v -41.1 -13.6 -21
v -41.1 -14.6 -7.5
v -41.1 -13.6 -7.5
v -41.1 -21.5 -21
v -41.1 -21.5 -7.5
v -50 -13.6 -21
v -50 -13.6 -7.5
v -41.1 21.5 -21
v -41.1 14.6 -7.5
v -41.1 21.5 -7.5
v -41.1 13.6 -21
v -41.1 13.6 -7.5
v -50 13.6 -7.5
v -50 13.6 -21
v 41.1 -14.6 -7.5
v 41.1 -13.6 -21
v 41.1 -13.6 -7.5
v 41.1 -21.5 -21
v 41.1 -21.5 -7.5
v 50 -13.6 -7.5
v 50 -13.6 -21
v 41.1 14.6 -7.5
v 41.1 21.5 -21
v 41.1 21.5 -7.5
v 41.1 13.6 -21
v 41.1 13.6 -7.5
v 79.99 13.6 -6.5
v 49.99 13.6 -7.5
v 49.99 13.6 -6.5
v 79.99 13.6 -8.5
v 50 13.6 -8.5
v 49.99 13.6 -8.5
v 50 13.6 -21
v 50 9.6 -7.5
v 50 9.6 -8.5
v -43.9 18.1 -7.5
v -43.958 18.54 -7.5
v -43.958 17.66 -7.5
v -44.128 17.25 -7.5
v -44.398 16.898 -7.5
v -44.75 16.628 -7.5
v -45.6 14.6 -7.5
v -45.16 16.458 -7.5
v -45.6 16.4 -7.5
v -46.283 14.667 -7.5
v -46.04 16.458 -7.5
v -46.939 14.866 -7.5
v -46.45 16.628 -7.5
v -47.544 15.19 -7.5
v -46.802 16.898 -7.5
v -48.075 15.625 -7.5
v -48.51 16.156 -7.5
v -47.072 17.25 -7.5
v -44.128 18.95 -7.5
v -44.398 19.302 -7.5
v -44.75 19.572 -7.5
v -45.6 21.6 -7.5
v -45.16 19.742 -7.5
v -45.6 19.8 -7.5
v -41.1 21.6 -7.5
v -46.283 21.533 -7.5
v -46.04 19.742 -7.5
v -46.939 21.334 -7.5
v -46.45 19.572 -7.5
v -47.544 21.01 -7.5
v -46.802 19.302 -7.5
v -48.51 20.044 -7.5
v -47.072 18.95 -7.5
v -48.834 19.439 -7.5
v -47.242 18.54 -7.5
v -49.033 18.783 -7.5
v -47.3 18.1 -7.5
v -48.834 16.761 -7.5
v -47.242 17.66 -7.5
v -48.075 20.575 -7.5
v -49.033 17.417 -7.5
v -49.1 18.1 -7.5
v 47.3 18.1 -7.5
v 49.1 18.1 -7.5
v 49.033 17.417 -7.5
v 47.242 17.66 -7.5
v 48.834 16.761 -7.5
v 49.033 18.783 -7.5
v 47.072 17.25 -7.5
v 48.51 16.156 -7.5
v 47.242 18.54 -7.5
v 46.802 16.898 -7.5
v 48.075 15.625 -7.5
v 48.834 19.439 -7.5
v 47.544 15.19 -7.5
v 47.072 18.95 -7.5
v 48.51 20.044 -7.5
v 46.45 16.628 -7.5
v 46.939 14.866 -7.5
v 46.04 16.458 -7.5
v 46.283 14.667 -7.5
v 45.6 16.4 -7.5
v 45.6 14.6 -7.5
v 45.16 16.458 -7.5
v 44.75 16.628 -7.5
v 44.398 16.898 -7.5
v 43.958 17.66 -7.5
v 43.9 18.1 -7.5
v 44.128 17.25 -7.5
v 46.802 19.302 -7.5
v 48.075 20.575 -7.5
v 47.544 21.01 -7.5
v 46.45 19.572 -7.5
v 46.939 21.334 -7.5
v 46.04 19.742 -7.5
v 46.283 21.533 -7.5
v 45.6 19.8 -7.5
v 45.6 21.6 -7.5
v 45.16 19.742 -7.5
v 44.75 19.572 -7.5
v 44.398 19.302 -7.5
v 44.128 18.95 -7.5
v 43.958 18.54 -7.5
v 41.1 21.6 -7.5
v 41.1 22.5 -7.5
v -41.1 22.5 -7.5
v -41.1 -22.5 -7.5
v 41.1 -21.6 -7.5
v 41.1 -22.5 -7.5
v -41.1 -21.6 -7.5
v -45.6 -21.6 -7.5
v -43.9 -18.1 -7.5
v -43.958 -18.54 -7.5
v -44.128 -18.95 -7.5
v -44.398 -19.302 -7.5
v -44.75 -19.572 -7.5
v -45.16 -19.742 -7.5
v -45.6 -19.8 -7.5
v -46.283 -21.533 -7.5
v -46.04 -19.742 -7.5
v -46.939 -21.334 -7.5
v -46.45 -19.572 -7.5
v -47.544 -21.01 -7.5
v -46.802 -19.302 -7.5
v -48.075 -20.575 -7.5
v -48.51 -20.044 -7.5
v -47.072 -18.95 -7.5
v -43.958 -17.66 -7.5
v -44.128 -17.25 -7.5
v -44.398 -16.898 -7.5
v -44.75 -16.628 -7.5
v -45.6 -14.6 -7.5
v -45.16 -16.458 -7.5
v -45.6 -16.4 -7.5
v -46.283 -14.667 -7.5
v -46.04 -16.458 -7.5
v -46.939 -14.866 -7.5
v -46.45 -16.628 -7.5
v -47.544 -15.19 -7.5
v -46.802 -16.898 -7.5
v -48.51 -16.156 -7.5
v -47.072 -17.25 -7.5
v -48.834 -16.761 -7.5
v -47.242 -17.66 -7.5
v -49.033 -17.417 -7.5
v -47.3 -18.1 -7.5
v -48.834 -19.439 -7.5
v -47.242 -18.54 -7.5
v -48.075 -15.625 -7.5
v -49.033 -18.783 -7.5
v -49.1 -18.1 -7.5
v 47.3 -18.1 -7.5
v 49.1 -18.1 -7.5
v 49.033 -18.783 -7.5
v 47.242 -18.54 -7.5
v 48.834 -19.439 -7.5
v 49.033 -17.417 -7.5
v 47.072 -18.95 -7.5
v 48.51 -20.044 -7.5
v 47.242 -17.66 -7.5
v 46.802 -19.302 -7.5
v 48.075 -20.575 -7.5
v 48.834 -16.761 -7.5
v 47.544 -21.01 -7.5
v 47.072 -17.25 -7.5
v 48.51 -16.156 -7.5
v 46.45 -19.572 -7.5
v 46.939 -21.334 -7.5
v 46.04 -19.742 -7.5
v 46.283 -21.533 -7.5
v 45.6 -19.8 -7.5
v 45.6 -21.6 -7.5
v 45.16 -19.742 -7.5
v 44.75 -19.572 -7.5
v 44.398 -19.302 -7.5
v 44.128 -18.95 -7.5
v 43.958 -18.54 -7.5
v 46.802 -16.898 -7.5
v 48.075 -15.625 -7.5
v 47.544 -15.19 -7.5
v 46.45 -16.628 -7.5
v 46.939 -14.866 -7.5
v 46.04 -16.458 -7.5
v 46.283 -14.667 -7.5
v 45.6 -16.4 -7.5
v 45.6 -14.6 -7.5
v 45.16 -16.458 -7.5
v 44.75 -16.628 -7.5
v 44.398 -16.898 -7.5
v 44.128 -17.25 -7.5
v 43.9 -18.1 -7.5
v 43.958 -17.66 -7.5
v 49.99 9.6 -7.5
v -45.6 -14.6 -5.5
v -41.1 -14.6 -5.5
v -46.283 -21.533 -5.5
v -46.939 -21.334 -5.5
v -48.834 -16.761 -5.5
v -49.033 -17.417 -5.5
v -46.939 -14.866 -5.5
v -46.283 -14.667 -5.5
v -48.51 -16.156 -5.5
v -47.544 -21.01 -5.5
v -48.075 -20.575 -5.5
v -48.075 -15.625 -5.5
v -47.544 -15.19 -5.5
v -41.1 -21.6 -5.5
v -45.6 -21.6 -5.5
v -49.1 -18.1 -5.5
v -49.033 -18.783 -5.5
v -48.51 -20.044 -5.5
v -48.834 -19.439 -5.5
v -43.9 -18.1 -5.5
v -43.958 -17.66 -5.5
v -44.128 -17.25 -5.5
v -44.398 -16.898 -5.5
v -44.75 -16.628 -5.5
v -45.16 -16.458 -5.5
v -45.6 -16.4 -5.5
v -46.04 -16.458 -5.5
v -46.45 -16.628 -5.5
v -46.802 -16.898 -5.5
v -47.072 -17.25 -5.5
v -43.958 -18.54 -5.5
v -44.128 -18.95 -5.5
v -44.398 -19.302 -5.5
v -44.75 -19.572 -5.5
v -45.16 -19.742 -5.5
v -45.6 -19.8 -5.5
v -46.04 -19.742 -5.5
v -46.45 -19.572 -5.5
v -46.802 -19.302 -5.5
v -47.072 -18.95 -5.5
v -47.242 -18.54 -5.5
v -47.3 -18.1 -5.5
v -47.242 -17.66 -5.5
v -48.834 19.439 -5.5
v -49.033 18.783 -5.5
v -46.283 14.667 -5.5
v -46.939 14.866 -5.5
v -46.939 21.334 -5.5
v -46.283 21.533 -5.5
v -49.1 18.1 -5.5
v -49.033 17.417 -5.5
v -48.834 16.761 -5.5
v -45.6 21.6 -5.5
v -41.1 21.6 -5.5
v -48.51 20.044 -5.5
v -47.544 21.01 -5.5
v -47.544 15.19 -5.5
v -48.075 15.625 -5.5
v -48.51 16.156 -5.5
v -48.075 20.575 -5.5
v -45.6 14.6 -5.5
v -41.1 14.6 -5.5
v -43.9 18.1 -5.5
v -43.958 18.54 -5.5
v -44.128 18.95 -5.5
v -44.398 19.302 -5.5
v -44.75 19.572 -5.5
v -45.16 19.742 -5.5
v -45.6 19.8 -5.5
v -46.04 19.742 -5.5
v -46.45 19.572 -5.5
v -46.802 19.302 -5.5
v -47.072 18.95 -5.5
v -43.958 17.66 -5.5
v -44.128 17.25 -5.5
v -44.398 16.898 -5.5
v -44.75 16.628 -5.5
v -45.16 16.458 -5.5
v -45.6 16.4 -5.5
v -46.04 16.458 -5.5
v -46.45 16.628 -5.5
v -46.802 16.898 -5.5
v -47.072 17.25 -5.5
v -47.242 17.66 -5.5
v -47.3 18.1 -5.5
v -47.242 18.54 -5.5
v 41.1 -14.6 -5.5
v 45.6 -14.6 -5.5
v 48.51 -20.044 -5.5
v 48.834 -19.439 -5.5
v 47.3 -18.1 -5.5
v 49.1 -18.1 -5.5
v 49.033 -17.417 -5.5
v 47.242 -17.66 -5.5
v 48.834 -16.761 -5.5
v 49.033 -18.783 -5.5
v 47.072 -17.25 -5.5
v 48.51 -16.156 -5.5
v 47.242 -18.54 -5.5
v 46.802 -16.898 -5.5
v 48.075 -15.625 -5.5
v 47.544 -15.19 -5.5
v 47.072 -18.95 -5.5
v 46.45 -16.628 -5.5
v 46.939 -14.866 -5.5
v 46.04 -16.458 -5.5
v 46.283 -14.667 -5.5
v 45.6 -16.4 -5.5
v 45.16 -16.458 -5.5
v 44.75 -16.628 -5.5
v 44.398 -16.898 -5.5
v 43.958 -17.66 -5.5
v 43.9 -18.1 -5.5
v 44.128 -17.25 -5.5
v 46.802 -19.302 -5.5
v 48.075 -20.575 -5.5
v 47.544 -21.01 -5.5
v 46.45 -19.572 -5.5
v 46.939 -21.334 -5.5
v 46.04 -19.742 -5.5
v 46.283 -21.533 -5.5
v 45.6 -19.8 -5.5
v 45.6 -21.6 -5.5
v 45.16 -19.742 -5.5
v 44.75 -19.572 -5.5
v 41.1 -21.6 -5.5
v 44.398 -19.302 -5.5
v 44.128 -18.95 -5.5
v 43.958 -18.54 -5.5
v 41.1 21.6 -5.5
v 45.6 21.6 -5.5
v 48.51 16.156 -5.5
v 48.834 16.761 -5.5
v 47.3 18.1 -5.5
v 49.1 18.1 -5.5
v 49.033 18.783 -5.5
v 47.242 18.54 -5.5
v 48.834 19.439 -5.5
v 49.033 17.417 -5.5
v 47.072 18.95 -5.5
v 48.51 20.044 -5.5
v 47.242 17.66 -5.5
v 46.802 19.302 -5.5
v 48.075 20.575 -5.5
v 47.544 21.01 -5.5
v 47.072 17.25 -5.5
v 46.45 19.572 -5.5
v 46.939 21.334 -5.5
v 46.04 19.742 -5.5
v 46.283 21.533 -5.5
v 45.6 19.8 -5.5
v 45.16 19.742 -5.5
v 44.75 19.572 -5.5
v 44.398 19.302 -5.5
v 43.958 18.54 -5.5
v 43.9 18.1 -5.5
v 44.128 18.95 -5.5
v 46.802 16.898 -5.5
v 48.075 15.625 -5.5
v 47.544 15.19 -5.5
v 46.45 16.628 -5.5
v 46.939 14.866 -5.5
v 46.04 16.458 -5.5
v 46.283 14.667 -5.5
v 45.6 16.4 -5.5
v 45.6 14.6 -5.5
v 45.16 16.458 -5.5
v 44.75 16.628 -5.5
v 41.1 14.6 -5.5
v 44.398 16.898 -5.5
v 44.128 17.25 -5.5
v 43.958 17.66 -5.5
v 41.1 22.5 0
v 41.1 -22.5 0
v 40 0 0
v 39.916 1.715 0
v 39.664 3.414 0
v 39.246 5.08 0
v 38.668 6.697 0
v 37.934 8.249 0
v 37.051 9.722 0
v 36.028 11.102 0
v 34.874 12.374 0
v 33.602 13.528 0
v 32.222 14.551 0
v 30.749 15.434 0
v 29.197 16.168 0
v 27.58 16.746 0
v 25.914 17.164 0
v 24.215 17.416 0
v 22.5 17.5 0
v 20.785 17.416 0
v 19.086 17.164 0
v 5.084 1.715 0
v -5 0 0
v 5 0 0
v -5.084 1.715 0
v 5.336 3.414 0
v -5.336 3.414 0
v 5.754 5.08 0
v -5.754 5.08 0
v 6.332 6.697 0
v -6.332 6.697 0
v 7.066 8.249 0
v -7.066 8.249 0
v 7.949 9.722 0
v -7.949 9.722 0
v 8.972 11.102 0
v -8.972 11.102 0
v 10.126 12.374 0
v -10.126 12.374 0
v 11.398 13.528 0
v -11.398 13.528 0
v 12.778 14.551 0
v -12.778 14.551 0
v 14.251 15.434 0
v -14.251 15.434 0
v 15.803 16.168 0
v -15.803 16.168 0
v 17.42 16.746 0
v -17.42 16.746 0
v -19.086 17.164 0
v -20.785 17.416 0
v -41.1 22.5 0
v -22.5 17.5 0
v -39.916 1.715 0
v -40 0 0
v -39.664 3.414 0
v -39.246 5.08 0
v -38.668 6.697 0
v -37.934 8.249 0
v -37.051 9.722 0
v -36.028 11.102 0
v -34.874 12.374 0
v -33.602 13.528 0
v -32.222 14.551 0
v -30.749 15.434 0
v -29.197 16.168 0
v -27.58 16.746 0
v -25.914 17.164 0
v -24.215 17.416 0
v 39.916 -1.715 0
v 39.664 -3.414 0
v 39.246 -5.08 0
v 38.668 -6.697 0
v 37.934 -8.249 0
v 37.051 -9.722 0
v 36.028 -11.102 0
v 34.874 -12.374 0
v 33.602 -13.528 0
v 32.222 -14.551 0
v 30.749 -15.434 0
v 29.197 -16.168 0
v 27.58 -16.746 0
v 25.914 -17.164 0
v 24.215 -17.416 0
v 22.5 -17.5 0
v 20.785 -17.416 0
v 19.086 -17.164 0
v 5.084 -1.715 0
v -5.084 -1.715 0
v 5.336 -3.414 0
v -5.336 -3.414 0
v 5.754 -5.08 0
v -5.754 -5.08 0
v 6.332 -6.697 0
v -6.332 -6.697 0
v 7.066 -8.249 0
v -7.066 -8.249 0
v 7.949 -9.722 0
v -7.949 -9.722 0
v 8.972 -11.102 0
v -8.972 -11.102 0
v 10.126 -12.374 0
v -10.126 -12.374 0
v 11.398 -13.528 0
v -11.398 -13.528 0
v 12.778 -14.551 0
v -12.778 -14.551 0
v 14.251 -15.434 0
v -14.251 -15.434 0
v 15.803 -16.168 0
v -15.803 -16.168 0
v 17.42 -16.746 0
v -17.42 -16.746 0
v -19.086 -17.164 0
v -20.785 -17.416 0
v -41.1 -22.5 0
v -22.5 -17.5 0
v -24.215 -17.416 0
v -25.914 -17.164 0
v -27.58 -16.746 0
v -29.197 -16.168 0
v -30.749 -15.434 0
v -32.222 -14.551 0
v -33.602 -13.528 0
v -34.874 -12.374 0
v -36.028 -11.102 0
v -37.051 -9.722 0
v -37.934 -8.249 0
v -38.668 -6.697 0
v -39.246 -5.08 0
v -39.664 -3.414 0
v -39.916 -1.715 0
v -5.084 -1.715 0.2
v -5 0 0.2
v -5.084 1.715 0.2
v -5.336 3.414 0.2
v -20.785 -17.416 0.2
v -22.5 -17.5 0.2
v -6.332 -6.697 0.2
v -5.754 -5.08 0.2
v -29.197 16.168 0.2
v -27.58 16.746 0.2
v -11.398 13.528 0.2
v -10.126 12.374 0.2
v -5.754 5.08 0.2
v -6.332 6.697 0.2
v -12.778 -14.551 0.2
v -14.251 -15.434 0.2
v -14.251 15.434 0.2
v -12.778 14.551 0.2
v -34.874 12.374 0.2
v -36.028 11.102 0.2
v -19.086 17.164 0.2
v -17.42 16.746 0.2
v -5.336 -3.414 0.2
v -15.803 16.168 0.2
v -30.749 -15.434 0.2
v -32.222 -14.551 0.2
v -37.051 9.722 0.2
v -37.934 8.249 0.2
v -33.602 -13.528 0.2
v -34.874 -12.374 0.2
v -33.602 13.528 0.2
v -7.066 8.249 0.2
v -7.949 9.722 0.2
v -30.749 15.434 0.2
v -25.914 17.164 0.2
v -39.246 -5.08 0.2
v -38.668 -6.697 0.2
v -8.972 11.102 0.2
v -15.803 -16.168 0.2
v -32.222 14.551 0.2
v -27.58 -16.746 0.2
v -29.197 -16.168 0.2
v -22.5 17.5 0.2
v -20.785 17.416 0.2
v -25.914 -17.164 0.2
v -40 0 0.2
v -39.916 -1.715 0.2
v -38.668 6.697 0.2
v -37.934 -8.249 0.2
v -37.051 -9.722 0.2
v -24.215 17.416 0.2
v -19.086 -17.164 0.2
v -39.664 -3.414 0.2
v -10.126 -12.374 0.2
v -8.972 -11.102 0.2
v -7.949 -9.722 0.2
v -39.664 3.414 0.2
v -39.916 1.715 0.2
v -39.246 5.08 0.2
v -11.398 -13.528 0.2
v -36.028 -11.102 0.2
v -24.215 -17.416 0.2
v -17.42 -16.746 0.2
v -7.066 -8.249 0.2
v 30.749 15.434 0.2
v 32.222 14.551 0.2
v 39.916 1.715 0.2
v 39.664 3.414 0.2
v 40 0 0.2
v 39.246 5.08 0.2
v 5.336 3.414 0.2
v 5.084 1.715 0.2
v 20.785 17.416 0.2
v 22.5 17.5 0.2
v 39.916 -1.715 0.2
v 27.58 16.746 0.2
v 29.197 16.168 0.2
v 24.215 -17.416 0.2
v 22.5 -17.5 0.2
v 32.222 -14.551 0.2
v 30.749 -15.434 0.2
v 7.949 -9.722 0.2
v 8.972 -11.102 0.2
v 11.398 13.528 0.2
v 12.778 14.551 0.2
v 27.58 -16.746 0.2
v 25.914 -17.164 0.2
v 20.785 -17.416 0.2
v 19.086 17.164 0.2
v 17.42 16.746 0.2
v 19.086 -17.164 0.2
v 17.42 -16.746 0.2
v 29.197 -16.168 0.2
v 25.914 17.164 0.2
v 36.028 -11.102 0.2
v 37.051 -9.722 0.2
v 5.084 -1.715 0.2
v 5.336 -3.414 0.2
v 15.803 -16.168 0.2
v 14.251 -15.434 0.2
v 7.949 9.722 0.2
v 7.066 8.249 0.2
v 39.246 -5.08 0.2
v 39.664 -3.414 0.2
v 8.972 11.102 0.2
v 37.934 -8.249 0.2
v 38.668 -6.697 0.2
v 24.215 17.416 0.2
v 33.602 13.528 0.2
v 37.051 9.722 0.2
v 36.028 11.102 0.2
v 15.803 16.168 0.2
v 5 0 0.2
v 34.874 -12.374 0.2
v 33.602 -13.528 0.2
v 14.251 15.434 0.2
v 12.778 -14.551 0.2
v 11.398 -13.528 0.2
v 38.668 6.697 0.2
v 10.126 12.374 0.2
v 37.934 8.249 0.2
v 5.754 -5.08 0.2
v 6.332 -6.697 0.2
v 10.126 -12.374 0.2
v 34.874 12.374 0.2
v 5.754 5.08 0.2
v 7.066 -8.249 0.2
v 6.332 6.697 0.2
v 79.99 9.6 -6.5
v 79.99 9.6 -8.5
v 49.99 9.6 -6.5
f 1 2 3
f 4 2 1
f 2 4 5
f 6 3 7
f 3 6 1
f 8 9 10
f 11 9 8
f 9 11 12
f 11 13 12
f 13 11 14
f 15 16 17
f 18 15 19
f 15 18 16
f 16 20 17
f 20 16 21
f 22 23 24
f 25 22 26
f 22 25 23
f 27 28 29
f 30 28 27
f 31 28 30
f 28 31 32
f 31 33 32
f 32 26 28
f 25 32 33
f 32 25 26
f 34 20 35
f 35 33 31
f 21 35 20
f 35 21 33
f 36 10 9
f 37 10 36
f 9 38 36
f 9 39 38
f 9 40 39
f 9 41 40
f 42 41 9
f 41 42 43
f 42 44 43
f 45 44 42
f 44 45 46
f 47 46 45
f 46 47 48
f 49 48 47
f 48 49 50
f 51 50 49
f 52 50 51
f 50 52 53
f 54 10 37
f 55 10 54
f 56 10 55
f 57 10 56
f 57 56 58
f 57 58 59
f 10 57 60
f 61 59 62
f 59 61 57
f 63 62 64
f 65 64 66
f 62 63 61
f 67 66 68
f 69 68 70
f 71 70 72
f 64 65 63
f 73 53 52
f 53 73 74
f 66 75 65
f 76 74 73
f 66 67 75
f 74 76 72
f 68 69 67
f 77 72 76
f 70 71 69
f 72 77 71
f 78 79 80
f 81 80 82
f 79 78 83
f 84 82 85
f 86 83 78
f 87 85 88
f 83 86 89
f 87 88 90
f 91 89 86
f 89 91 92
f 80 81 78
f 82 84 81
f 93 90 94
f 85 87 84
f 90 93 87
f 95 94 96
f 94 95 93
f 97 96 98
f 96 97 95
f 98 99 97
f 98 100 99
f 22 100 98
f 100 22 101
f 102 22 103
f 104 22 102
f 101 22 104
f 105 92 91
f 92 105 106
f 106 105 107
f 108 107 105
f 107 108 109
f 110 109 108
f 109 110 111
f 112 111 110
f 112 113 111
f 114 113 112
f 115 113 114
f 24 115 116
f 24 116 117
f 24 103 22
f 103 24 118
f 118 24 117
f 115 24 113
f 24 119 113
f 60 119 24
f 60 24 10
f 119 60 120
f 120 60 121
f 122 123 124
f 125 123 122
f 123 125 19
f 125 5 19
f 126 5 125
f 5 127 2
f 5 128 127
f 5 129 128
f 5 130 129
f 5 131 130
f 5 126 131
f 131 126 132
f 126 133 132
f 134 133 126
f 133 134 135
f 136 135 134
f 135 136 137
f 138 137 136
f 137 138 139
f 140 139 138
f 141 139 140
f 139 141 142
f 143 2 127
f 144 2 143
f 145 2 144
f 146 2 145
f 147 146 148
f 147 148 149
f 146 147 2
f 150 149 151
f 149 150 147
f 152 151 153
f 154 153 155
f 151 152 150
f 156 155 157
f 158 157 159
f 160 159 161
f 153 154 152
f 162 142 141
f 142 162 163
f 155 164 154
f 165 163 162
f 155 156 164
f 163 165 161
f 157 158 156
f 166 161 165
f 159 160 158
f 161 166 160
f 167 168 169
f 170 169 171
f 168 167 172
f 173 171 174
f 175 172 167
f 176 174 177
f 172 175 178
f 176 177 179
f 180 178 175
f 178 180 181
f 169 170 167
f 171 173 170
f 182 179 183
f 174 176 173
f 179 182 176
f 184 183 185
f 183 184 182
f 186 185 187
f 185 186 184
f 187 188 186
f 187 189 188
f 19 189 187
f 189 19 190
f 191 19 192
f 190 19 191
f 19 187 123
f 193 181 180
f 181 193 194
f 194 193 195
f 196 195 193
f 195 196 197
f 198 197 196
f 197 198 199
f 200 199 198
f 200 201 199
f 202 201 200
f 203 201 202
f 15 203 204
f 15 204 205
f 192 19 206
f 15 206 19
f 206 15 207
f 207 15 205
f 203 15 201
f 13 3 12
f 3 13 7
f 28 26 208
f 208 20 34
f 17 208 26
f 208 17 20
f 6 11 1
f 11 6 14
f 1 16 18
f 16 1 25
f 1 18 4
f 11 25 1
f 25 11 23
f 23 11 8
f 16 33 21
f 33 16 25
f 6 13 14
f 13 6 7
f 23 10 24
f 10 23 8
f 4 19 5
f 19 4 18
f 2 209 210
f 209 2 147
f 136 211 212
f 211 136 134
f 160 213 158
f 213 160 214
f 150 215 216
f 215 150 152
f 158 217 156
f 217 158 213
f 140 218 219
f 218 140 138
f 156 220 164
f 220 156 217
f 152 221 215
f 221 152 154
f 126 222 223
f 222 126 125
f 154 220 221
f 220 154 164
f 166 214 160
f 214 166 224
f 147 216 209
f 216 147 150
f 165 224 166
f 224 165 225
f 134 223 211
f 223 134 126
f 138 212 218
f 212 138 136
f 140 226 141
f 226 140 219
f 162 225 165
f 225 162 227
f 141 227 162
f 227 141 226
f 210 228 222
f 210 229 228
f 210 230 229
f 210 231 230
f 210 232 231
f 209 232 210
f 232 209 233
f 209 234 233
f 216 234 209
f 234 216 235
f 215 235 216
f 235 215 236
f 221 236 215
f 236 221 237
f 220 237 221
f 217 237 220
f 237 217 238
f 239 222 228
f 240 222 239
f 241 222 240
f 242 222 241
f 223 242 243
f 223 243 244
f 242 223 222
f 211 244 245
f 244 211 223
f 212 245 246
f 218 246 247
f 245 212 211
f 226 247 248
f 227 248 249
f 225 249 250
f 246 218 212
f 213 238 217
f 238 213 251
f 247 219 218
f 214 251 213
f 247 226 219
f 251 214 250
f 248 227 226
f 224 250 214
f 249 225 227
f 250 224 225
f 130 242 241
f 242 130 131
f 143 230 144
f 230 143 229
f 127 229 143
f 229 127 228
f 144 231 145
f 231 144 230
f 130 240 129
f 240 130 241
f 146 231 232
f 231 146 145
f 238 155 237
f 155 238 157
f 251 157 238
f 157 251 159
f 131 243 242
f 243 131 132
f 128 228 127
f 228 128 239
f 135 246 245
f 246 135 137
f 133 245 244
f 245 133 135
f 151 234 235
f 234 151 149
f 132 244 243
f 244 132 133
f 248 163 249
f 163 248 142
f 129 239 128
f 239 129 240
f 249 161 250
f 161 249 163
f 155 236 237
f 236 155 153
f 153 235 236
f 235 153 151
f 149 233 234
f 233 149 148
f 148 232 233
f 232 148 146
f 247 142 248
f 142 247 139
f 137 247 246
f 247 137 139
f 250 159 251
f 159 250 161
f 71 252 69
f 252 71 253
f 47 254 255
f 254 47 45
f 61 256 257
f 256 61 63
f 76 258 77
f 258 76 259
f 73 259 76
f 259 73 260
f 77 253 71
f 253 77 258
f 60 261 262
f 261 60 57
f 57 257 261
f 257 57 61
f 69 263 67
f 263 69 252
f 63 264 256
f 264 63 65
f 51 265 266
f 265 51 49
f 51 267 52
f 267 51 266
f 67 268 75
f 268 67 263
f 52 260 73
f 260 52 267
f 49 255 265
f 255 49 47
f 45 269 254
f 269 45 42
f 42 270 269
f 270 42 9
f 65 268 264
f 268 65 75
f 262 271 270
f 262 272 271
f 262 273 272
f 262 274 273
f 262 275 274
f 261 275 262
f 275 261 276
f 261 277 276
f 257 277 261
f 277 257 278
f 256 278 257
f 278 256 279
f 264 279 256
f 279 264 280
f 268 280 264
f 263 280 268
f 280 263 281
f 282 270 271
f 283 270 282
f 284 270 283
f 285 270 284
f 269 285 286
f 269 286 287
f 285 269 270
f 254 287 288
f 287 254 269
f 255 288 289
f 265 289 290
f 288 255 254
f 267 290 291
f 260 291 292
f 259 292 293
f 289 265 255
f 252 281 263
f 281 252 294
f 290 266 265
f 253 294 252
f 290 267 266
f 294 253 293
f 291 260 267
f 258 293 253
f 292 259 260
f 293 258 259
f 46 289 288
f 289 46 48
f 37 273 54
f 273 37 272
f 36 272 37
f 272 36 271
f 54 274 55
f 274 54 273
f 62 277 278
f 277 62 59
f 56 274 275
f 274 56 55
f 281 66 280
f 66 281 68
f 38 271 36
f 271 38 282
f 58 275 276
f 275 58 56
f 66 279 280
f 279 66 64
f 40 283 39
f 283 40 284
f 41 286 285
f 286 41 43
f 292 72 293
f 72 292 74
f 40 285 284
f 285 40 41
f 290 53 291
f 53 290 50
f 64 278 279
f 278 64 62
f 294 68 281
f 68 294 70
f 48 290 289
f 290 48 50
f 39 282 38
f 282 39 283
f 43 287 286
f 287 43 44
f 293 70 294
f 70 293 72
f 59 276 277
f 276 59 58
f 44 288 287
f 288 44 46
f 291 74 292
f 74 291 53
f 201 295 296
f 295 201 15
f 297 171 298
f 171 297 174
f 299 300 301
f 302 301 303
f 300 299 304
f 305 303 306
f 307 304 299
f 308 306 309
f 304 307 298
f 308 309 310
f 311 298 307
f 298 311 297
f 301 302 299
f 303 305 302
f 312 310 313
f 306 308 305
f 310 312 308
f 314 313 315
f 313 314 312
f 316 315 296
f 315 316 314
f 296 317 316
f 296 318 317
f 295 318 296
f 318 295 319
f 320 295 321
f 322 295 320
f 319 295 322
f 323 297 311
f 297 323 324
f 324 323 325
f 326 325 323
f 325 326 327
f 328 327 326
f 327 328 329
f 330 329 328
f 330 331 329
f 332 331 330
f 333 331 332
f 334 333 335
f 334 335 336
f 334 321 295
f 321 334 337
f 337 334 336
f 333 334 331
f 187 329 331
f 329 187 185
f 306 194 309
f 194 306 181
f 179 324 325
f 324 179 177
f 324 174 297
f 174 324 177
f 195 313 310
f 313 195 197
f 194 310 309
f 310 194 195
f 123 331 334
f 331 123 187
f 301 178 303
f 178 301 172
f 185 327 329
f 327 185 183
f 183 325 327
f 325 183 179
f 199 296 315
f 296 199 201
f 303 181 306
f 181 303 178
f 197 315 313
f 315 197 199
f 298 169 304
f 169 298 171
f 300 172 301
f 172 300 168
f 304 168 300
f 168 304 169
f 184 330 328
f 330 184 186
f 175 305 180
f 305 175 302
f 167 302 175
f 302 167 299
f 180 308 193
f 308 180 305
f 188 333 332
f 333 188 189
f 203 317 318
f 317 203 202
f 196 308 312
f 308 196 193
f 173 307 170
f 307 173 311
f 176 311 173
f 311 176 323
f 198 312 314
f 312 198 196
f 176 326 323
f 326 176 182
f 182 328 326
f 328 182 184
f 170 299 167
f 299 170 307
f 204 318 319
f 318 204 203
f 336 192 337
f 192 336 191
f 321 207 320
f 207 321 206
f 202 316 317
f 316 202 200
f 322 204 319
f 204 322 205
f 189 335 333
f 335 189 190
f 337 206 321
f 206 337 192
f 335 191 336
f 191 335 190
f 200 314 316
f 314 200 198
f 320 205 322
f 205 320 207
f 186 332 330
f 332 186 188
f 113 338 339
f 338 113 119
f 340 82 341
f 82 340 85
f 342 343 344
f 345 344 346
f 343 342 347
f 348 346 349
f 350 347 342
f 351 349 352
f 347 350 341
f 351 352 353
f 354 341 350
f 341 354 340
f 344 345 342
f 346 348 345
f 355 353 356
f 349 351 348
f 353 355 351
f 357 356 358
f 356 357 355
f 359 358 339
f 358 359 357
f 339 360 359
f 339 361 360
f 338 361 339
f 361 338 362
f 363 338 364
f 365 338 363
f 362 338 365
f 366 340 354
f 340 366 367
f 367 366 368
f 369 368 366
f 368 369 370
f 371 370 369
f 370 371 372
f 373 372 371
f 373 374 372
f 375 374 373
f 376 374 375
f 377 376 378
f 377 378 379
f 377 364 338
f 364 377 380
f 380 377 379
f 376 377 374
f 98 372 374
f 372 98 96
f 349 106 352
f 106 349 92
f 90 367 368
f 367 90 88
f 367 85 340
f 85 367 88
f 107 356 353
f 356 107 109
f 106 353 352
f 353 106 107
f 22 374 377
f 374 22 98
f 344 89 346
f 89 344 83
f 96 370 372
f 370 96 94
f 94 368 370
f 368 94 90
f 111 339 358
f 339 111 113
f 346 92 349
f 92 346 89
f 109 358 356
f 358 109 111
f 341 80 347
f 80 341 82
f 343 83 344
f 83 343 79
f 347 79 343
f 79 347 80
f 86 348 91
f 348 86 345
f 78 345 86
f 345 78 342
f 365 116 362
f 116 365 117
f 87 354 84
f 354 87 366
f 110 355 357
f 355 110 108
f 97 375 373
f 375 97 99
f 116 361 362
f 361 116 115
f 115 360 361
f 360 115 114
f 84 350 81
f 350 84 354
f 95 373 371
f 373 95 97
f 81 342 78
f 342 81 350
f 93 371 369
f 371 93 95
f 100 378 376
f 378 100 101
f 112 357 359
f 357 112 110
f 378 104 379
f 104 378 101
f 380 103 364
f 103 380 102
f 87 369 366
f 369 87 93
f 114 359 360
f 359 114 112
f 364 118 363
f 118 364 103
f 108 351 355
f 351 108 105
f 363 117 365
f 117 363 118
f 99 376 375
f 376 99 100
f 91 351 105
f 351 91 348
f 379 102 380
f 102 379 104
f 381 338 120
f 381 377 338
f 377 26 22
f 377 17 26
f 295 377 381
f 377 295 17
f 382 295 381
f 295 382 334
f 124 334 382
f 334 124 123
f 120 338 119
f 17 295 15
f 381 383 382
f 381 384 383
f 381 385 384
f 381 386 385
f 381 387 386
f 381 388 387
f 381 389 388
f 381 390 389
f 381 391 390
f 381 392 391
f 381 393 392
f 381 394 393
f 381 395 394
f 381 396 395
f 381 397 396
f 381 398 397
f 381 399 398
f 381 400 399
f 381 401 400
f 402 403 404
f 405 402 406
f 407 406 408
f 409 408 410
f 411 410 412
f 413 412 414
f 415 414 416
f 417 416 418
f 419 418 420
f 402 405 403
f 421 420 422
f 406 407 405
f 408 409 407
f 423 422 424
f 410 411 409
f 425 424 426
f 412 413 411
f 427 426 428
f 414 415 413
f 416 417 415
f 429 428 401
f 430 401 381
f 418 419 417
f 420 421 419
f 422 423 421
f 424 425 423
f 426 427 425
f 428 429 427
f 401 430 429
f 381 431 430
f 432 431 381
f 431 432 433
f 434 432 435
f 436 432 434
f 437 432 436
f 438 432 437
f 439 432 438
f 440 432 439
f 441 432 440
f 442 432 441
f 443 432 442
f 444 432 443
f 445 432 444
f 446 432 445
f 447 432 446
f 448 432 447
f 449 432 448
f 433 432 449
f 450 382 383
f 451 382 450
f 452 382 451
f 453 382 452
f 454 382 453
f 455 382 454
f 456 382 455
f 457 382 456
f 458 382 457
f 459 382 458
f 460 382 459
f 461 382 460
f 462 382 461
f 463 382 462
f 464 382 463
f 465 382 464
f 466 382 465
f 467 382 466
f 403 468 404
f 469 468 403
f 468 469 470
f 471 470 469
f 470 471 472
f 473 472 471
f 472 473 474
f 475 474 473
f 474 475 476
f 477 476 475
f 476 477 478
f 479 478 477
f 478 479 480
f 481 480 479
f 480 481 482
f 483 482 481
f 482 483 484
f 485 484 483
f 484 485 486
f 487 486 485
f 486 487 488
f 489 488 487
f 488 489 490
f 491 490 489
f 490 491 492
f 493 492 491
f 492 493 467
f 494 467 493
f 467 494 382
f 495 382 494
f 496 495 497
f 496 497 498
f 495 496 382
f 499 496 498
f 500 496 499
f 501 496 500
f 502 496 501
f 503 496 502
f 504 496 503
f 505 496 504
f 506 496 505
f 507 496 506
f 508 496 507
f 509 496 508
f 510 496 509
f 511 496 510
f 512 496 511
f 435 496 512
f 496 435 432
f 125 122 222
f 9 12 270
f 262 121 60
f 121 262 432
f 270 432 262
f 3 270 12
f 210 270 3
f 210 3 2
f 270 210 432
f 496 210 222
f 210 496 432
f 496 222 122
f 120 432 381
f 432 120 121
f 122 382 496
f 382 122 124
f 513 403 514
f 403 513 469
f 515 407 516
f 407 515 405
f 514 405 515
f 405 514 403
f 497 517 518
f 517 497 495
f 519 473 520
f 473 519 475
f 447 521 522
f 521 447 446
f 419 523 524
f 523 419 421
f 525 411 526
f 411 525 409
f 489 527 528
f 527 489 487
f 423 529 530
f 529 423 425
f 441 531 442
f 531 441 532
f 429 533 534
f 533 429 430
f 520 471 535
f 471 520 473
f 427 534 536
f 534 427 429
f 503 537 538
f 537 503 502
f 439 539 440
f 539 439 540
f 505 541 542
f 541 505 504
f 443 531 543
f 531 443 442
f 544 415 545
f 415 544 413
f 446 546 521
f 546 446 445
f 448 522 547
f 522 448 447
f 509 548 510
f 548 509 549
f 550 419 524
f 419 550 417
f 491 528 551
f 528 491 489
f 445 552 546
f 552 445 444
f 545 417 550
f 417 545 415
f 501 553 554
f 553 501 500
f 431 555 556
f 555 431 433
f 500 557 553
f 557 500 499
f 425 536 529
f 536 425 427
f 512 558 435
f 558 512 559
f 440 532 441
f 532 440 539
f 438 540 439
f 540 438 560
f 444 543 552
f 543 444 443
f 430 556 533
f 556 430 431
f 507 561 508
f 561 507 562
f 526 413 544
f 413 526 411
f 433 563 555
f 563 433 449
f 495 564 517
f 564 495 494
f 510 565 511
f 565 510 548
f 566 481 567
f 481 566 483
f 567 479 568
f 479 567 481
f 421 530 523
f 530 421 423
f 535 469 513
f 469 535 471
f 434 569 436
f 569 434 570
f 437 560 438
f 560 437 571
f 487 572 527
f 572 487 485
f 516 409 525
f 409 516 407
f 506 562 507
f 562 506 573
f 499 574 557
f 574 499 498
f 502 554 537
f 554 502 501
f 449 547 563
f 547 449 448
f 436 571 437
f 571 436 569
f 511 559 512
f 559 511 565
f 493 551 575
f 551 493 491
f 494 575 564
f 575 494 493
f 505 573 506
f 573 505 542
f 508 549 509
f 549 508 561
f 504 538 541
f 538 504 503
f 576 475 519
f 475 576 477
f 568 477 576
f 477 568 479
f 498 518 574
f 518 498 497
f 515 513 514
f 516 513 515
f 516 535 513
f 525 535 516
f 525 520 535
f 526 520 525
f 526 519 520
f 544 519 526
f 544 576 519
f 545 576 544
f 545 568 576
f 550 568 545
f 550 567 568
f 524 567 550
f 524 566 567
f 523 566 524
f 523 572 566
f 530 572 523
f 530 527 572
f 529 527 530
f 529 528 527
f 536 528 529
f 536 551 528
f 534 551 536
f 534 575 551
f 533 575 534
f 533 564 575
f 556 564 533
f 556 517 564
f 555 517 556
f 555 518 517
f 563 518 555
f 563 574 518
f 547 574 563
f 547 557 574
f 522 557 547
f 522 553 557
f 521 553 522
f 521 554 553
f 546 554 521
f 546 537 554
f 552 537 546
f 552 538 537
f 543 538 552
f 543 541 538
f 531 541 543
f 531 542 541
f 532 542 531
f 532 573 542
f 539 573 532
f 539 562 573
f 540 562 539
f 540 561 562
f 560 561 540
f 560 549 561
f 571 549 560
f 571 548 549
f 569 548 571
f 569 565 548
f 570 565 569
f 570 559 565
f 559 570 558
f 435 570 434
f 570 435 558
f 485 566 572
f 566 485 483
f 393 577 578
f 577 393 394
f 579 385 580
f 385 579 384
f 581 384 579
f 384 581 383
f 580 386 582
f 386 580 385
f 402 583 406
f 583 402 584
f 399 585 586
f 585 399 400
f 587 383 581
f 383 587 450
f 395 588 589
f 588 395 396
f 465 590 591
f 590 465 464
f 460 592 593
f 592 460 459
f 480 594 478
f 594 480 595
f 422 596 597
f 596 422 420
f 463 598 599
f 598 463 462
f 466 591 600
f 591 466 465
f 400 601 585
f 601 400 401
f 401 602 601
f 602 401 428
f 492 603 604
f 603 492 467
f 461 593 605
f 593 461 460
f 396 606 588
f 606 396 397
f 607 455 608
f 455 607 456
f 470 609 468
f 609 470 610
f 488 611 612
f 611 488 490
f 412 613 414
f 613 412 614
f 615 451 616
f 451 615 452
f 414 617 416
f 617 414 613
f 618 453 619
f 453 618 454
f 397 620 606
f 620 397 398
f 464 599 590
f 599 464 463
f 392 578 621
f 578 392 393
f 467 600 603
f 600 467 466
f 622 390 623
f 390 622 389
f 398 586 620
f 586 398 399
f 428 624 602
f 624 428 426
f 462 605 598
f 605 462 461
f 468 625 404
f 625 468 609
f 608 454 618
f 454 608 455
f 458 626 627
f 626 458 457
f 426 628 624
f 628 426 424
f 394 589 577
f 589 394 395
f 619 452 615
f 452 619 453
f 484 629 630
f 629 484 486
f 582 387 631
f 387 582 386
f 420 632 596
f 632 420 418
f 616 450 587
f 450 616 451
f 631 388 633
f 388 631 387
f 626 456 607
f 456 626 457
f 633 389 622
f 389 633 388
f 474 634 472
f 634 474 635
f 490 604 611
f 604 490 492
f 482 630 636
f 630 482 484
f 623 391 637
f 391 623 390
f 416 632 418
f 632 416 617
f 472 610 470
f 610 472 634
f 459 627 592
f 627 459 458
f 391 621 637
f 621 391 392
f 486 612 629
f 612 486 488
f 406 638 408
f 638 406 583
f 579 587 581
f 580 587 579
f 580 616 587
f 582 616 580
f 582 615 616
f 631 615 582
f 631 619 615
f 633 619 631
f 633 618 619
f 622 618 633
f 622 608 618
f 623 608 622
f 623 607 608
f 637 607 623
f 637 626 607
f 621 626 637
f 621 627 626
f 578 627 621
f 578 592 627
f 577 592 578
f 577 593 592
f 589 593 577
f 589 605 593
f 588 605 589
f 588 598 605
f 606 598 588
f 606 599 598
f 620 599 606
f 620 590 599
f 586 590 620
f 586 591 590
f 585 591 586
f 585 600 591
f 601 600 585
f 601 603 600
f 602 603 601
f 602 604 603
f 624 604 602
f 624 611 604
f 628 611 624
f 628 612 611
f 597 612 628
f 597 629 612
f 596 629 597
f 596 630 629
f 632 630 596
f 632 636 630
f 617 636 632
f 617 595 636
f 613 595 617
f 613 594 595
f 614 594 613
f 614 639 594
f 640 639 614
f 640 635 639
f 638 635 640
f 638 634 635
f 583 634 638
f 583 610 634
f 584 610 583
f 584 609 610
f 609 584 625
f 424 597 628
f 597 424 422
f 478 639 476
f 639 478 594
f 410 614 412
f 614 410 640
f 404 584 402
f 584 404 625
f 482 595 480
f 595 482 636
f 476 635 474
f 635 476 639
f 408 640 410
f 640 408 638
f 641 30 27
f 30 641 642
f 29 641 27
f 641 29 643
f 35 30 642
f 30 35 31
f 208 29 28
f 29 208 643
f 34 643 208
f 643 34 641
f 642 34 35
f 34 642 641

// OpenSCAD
// Dummy model of the Core Electronics CE08483 / Waveshare "8Ω 5W Speaker".
// Numbers and their confidence are in SPEAKER_SPEC.md. The dummy is used for
// the preview assembly and for the automated clearance check (check_model.py);
// it models the *envelope* the housing must clear, not cosmetics.
//
// Frame: X along the 100 mm length, Y across the 45 mm width, Z through the
// 21 mm thickness. Origin at the centre of the front face; the body extends
// toward -Z (front face z = 0, back face z = -21).

spk_len     = 100;   // overall length, ears included           (high confidence)
spk_wid     = 45;    // overall width                           (high)
spk_thk     = 21;    // overall thickness                       (high)
spk_hole_dx = 91.2;  // ear-hole pattern along X                (high)
spk_hole_dy = 36.2;  // ear-hole pattern along Y                (high)
spk_hole_d  = 3.4;   // ear hole, design value for an M3 screw  (low: Core says "6 mm")
spk_ear_w   = 7;     // ear tab width, outside                  (low)
spk_ear_t   = 2;     // ear tab thickness                       (low)
spk_ear_z   = 7.5;   // ear REAR face behind the front face     (low: 6-9)
spk_cone_d  = 35;    // driver and passive radiator diameter    (high)
spk_cone_x  = 27.5;  // cone centre from each end along X       (medium)
spk_recess_d = 40;   // shallow recess around each cone         (low)
spk_rear_inset = 1;  // rear shell inset per side, in Y         (low)
spk_lead_w  = 4;     // two side-by-side 1.5 mm leads            (medium)
spk_lead_h  = 2;

// derived
spk_hole_x  = spk_hole_dx / 2;                      // 45.6
spk_hole_y  = spk_hole_dy / 2;                      // 18.1
spk_front_len = 2 * (spk_hole_x - spk_ear_w / 2 - 1); // front shell length, inferred (82.2)
spk_notch_len = (spk_len - spk_front_len) / 2;      // corner notch length in the rear shell
spk_notch_wid = spk_wid / 2 - spk_hole_y + spk_ear_w / 2 + 1; // corner notch width
spk_lead_y  = spk_hole_y - spk_ear_w / 2 - 3;       // lead exit beside the +Y ear, +X end

module speaker_ce08483(leads = true, cones = true) {
    color("DimGray") {
        // front shell: full width, shorter than overall length
        translate([-spk_front_len / 2, -spk_wid / 2, -spk_ear_z])
            cube([spk_front_len, spk_wid, spk_ear_z]);
        // rear shell: full length, inset in Y, notched at the corners for the ears
        difference() {
            translate([-spk_len / 2, -spk_wid / 2 + spk_rear_inset, -spk_thk])
                cube([spk_len, spk_wid - 2 * spk_rear_inset, spk_thk - spk_ear_z]);
            for (sx = [-1, 1], sy = [-1, 1])
                translate([sx > 0 ? spk_front_len / 2 : -spk_len / 2 - 1,
                           sy > 0 ? spk_wid / 2 - spk_notch_wid : -spk_wid / 2 - 1,
                           -spk_thk - 1])
                    cube([spk_notch_len + 1, spk_notch_wid + 1, spk_thk]);
        }
        // the four ears, in the parting plane
        for (sx = [-1, 1], sy = [-1, 1])
            translate([0, 0, -spk_ear_z])
                difference() {
                    hull() {
                        translate([sx * spk_hole_x, sy * spk_hole_y, 0])
                            cylinder(d = spk_ear_w, h = spk_ear_t, $fn = 32);
                        translate([sx > 0 ? spk_front_len / 2 - 0.01 : -spk_front_len / 2,
                                   sy * spk_hole_y - spk_ear_w / 2, 0])
                            cube([0.01, spk_ear_w, spk_ear_t]);
                    }
                    translate([sx * spk_hole_x, sy * spk_hole_y, -1])
                        cylinder(d = spk_hole_d, h = spk_ear_t + 2, $fn = 24);
                }
    }
    if (cones)
        color("Black")
            for (sx = [-1, 1])
                translate([sx * (spk_len / 2 - spk_cone_x), 0, 0])
                    cylinder(d = spk_cone_d, h = 0.2, $fn = 64);
    if (leads)
        color("Red")
            translate([spk_len / 2 - 0.01, spk_lead_y - spk_lead_w / 2, -spk_ear_z - spk_lead_h / 2])
                cube([30, spk_lead_w, spk_lead_h]);
}

// Solid envelope: the 100 x 45 x 21 brick a pocket must clear, plus `clearance`
// on the sides and back (the front face stays at z = 0).
module speaker_envelope(clearance = 0) {
    translate([-spk_len / 2 - clearance, -spk_wid / 2 - clearance, -spk_thk - clearance])
        cube([spk_len + 2 * clearance, spk_wid + 2 * clearance, spk_thk + clearance]);
}

speaker_ce08483();
